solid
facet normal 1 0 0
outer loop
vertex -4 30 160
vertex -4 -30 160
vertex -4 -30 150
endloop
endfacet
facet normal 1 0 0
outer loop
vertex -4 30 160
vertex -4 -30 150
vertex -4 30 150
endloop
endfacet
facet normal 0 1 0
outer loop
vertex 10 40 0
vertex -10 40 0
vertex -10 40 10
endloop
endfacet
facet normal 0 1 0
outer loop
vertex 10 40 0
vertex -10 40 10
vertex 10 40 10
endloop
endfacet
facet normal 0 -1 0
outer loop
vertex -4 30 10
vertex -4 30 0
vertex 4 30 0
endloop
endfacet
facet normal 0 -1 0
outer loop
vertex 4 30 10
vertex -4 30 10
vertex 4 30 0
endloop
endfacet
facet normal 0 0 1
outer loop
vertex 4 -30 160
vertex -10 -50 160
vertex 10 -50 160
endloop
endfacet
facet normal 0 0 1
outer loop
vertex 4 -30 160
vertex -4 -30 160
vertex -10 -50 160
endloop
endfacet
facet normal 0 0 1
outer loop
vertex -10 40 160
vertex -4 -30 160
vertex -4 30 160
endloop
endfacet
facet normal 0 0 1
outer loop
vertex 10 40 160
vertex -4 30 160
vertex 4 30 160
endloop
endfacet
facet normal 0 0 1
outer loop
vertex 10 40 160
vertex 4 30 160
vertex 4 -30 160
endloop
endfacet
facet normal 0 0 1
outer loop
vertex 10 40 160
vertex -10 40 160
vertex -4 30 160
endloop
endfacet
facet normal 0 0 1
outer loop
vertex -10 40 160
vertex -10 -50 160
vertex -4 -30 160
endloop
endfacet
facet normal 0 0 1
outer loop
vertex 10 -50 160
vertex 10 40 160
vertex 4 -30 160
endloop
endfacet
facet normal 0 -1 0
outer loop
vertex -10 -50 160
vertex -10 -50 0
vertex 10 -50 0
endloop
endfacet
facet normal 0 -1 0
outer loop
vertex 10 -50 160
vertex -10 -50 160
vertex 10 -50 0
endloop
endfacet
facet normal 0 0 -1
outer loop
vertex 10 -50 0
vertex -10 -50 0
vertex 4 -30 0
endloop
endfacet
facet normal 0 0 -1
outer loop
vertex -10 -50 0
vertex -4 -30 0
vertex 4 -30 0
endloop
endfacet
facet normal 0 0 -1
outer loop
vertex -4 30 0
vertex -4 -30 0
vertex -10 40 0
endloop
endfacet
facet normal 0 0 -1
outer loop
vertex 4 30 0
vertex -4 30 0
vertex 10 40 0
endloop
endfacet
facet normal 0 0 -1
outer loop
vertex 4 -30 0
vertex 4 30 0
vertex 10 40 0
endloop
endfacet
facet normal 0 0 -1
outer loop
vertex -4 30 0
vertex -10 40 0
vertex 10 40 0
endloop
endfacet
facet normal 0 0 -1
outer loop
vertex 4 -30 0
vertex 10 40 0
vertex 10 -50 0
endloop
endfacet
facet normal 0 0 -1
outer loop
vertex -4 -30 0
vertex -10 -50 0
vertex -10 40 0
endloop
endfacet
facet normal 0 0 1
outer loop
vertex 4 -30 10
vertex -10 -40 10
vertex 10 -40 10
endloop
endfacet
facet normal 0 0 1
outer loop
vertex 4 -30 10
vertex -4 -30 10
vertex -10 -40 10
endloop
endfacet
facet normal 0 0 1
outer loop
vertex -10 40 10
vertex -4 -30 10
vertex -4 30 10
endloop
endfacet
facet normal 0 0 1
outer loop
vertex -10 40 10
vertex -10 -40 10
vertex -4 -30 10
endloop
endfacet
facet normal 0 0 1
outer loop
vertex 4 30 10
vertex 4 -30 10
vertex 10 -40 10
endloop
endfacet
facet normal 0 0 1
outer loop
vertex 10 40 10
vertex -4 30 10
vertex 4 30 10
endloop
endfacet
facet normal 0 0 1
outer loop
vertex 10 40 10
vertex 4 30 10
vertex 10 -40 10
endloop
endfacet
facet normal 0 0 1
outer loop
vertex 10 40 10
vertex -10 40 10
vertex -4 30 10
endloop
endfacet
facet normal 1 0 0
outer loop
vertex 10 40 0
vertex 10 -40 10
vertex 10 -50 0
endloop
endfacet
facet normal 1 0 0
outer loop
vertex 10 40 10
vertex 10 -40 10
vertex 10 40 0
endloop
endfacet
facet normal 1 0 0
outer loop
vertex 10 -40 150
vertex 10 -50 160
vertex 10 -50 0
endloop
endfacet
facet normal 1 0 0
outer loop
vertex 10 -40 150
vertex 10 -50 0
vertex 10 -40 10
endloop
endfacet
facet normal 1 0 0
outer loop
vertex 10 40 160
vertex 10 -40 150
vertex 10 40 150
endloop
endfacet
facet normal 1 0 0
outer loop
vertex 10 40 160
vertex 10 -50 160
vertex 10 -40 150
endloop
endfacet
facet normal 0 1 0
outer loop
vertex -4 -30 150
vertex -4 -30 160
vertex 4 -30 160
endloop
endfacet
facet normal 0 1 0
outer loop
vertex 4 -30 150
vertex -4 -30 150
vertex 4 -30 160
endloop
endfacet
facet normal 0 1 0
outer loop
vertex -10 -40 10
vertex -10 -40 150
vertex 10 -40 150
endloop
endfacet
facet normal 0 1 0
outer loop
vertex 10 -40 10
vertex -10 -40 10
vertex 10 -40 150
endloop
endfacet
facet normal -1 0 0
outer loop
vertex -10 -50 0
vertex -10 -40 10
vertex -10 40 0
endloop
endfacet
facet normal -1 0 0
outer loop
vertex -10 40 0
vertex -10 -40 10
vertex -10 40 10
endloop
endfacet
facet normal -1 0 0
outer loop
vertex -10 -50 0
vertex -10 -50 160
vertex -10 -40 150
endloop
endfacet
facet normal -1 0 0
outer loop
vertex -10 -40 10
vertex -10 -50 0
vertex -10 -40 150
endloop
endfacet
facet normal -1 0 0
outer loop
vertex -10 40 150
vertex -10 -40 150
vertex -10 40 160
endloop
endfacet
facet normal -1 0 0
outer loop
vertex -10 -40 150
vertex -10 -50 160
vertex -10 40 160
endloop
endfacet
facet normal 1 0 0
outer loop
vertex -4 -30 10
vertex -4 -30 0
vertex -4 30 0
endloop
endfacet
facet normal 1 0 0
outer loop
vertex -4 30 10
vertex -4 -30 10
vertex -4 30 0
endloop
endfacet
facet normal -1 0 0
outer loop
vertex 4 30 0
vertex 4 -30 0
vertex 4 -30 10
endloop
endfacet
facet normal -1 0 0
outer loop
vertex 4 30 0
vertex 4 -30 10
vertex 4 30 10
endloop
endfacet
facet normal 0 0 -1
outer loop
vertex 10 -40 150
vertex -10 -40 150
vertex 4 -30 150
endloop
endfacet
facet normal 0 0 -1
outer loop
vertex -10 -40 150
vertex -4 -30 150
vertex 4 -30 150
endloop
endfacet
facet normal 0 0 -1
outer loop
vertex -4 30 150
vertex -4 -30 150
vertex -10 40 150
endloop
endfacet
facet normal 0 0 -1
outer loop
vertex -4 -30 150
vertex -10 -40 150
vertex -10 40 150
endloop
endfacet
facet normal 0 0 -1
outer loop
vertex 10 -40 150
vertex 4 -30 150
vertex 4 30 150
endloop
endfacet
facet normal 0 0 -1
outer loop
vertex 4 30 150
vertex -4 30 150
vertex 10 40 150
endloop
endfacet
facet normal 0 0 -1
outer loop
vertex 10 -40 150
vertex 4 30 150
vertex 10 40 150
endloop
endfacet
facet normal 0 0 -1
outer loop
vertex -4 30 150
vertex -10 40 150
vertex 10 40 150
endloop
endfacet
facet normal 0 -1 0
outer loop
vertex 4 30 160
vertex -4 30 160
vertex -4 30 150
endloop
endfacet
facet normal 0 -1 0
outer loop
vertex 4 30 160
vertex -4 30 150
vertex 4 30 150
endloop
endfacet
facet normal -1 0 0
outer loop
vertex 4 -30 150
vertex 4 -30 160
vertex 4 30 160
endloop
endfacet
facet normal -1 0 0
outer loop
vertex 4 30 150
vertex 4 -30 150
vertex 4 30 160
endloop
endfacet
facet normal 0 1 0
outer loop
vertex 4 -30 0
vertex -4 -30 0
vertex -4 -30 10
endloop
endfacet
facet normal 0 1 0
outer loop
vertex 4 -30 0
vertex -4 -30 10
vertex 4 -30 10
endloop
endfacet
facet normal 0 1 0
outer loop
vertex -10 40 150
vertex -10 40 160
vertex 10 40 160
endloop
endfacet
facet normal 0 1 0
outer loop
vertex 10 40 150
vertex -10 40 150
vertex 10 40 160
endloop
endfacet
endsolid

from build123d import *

# Parameters (mm, degrees)
ESBO_O1_W                = 20
ESBO_O1_H                = 80
ESBO_O1_W_2              = 8
ESBO_O1_H_2              = 60
RESSALTO_EXTRUS_O1_DEPTH = 10
ESBO_O1_4_W              = 20
ESBO_O1_4_H              = 10
RESSALTO_EXTRUS_O3_DEPTH = 80


with BuildPart() as part:
    # Esboço1 → Ressalto-extrusão1 (new body)
    with BuildSketch(Plane.XY):
        Rectangle(ESBO_O1_W, ESBO_O1_H)
        Rectangle(ESBO_O1_W_2, ESBO_O1_H_2, mode=Mode.SUBTRACT)
    ressalto_extrus_o1 = extrude(amount=RESSALTO_EXTRUS_O1_DEPTH)

    # Esboço1<4> → Ressalto-extrusão3 (add)
    with BuildSketch(Plane.XY):
        with Locations((0, -45)):
            Rectangle(ESBO_O1_4_W, ESBO_O1_4_H)
    ressalto_extrus_o3 = extrude(amount=RESSALTO_EXTRUS_O3_DEPTH)

    # Espelhar2: Ressalto-extrusão1, Ressalto-extrusão3 across plane
    add(ressalto_extrus_o1.mirror(Plane.XY.offset(80)))
    add(ressalto_extrus_o3.mirror(Plane.XY.offset(80)))


solid = part.part
